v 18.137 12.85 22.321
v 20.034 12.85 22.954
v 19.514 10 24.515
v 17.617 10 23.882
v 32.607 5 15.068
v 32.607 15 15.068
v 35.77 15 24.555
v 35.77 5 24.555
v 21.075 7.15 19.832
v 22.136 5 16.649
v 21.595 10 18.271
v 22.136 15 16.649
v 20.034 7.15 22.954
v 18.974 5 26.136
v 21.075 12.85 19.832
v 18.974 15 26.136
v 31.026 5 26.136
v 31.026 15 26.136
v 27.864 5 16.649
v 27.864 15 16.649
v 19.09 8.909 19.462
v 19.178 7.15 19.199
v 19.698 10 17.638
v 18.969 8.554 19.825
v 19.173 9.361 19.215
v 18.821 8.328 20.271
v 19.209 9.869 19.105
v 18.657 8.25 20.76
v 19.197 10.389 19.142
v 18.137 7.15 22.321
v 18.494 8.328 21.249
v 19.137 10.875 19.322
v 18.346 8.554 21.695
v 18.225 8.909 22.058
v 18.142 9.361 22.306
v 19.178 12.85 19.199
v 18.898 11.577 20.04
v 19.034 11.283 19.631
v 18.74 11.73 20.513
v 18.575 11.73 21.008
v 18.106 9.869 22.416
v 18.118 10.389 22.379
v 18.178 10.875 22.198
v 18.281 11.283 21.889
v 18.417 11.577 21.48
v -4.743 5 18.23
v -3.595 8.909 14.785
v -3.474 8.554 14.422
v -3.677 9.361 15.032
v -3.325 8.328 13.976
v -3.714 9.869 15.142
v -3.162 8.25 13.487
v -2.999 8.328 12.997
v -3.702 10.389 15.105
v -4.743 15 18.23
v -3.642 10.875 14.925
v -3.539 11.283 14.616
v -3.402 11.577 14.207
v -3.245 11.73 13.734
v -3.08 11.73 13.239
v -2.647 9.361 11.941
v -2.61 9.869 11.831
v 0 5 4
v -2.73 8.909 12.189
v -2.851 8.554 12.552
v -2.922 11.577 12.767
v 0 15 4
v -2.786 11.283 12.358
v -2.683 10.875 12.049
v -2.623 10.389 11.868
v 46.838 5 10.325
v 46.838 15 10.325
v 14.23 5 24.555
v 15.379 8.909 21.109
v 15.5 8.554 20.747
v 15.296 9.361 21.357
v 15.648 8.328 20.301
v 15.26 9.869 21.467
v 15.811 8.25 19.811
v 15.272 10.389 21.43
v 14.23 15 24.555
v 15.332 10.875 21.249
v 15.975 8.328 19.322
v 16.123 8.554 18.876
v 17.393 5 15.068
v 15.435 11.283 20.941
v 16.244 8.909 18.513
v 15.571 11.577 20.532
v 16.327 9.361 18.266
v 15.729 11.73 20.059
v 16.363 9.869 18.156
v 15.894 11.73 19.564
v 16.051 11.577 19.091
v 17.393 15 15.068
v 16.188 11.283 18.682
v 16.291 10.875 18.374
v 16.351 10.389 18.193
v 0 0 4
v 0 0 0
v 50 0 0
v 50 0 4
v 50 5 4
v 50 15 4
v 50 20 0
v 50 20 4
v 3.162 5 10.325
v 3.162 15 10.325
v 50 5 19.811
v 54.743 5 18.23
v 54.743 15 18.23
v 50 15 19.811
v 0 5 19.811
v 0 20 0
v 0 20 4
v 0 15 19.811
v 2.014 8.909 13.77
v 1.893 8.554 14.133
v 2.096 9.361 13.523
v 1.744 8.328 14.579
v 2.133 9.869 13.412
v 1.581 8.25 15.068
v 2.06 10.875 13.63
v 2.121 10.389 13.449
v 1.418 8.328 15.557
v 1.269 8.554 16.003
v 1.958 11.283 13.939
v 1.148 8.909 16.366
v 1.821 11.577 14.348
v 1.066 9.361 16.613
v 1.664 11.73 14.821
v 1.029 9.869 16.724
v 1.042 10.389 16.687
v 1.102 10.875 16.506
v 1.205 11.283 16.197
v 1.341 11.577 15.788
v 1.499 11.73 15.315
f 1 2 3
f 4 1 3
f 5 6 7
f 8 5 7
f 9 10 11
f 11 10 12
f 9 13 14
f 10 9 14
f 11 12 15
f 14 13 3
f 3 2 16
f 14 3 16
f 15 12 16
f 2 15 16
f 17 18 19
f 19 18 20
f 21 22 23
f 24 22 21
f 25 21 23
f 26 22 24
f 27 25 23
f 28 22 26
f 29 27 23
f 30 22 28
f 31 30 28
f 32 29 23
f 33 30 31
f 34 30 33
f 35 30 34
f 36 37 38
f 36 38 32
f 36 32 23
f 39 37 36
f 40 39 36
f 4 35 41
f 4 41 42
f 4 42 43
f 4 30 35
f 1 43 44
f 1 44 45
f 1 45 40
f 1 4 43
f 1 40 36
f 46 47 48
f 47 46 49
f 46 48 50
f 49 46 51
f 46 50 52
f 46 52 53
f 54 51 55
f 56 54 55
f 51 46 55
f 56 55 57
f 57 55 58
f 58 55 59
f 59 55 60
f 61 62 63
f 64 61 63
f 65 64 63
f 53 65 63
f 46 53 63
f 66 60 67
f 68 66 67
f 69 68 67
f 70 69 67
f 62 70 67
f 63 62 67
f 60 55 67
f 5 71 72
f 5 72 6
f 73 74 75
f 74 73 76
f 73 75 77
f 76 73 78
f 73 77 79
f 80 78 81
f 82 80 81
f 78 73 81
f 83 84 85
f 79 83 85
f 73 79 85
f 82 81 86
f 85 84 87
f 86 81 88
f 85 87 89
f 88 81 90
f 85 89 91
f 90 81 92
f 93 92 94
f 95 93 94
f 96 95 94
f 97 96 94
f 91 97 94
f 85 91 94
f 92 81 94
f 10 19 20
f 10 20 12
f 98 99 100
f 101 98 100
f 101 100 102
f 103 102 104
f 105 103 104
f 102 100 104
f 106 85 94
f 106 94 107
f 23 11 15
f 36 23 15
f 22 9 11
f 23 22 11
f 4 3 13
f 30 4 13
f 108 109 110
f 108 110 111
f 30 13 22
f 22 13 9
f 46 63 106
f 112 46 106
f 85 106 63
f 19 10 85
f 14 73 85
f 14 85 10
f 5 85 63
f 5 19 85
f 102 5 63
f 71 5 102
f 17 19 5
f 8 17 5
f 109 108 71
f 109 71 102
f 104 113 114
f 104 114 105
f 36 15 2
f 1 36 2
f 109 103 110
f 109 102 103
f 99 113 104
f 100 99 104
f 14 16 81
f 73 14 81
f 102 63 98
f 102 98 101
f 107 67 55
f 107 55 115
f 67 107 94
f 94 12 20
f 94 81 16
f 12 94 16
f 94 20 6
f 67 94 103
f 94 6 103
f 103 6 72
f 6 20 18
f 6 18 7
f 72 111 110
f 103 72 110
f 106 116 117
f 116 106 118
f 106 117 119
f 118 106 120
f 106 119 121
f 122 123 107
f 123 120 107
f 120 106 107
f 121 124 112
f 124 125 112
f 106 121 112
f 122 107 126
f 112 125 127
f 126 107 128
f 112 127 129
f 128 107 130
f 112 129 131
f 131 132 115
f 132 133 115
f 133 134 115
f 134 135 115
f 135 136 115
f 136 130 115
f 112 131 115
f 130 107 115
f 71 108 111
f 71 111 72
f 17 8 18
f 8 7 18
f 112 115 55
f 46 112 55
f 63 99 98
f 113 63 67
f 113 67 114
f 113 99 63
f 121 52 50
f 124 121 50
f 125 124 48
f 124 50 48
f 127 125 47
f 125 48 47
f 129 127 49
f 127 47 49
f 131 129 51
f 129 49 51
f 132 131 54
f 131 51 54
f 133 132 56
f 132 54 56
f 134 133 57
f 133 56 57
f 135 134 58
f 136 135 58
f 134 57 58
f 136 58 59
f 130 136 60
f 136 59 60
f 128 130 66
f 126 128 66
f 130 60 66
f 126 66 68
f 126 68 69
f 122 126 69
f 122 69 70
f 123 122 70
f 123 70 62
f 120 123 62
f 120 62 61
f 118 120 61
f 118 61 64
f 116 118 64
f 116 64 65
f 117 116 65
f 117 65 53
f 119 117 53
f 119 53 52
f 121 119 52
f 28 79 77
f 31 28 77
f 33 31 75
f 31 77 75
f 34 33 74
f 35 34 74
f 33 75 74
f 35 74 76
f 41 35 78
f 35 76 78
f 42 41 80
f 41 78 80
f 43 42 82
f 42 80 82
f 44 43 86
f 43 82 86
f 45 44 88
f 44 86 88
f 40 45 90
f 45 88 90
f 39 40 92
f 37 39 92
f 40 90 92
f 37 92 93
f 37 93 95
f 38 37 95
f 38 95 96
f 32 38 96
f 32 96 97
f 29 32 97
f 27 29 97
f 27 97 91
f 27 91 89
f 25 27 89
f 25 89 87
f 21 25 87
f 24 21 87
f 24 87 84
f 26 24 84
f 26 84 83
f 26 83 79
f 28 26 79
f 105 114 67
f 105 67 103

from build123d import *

# Parameters (mm, degrees)
F0_W      = 50
F0_H      = 20
F1_DEPTH  = 4
F4_DEPTH  = 5
F5_R      = 1.75
F6_DEPTH  = 25
F8_DEPTH  = 2
F10_DEPTH = 10
F12_DEPTH = 10


with BuildPart() as f1:
    # F0 (on Top) → F1 (new body)
    with BuildSketch(Plane.XY):
        with Locations((25, 10)):
            Rectangle(F0_W, F0_H)
    extrude(amount=F1_DEPTH)

    # F3 (on offset) → F4 (join, symmetric)
    with BuildSketch(Plane.XZ.offset(-10)):
        Polygon((-4.7434164903, 18.2302494708), (0, 4), (5.2704627669, 4), (0, 19.8113883008), align=None)
        Polygon((14.2302494708, 24.5548047911), (21.0818510678, 4), (28.9181489322, 4), (35.7697505292, 24.5548047911), (31.026334039, 26.1359436212), (25, 8.0569415042), (18.973665961, 26.1359436212), align=None)
        Polygon((50, 4), (54.7434164903, 18.2302494708), (50, 19.8113883008), (44.7295372331, 4), align=None)
    extrude(amount=F4_DEPTH, both=True)

    # F5 (on face) → F6 (cut, through all)
    with BuildSketch(Plane(origin=(1.2, 0, 0.4), x_dir=(0, -1, 0), z_dir=(-0.9486832981, 0, -0.316227766))):
        with Locations((-10, 13.7947331922)):
            Circle(F5_R)
    extrude(amount=-F6_DEPTH, mode=Mode.SUBTRACT)

    # F7 (on face) → F8 (cut)
    with BuildSketch(Plane(origin=(24.9170824513, 0, 8.3056941504), x_dir=(0, 1, 0), z_dir=(0.9486832981, 0, 0.316227766))):
        Polygon((12.85, 12.1492849251), (12.85, 15.4401814595), (10, 17.0856297267), (7.15, 15.4401814595), (7.15, 12.1492849251), (10, 10.5038366579), align=None)
    extrude(amount=-F8_DEPTH, mode=Mode.SUBTRACT)

    # F9 (on face) → F10 (join, through all)
    with BuildSketch(Plane.XZ.offset(-5)):
        Polygon((22.135944317, 16.6491085532), (25, 8.0569415042), (27.864055683, 16.6491085532), align=None)
    extrude(amount=-F10_DEPTH)

    # F11 (on face) → F12 (join, through all)
    with BuildSketch(Plane.XZ.offset(-5)):
        Polygon((17.3925278267, 15.0679697232), (3.162278356, 10.3245532329), (5.2704627669, 4), (21.0818510678, 4), align=None)
        Polygon((28.9181489322, 4), (44.7295372331, 4), (46.837721644, 10.3245532329), (32.6074721733, 15.0679697232), align=None)
    extrude(amount=-F12_DEPTH)


solid = f1.part
